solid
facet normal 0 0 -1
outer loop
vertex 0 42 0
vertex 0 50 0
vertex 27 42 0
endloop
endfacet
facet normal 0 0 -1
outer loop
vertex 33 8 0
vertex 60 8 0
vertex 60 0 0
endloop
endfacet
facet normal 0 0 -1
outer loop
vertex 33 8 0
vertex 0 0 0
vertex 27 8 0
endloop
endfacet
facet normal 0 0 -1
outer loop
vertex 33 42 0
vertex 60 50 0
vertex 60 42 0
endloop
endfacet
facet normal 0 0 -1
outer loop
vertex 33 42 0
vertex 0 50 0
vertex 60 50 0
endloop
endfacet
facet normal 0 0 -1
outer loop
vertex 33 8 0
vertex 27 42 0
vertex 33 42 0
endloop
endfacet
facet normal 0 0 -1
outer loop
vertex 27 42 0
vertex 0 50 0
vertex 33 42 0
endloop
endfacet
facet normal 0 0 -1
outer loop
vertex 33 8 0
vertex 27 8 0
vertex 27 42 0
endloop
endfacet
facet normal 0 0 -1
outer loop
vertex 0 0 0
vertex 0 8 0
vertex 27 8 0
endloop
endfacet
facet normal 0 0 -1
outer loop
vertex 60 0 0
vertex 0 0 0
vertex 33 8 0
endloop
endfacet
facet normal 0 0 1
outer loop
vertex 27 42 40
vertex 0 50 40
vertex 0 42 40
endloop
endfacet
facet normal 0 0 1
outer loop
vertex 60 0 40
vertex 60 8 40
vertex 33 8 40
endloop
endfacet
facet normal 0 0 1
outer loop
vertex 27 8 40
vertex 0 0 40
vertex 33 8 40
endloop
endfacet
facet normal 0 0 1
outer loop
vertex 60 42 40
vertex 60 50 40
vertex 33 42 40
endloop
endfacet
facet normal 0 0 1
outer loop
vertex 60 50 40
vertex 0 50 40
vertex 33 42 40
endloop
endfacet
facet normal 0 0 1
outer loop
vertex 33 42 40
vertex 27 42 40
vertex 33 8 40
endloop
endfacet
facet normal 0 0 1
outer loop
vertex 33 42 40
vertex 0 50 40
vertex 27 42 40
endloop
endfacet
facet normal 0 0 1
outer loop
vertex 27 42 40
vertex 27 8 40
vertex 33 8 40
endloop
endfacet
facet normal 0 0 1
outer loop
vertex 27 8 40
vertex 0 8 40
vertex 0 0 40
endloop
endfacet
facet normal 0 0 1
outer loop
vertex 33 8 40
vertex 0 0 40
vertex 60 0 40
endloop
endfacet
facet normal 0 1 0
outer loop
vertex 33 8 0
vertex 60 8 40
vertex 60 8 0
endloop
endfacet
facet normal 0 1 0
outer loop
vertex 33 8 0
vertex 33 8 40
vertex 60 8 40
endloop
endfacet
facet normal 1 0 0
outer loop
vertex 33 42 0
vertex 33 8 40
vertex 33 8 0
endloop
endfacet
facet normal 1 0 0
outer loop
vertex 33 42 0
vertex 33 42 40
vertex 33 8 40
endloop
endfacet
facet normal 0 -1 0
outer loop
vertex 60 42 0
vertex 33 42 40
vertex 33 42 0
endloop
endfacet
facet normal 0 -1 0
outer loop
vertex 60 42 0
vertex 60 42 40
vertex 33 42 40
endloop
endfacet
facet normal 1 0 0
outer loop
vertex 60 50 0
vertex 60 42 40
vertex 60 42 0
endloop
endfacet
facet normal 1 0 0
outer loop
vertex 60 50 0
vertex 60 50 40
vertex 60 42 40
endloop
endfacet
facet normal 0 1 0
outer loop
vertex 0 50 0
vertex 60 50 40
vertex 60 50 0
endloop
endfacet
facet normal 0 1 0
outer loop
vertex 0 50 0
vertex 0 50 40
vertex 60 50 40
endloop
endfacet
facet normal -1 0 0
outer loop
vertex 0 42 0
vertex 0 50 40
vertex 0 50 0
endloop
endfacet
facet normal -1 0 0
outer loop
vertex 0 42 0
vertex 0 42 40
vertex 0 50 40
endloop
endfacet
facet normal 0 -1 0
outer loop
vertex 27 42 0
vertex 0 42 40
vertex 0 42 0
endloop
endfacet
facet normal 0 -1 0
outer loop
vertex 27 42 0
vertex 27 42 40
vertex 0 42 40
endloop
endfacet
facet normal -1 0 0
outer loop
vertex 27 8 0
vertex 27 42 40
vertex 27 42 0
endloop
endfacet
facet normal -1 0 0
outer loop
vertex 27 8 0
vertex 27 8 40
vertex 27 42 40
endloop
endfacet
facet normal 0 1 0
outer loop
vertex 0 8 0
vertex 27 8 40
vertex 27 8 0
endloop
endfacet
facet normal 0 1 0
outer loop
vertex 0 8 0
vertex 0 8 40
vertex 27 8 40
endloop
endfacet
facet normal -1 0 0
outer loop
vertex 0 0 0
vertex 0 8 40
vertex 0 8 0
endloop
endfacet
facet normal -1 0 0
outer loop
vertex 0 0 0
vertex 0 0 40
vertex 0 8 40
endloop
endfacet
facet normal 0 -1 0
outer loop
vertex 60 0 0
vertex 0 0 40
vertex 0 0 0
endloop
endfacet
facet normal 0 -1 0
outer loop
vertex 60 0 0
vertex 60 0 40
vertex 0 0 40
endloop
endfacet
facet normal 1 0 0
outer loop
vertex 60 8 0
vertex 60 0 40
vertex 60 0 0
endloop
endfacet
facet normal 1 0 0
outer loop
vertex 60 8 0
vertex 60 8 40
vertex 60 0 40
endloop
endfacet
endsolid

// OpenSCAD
$fn = 32;

// ----------------------------------------------------------------------
// Structural section: ibeam 60 x 50 mm
// ----------------------------------------------------------------------

// --- parameters (mm) ---
sec_w = 60;               // section width, X
sec_h = 50;               // section height, Y
flange_t = 8;             // flange thickness
web_t = 6;                // web thickness
plate_t = 40;             // cut length, Z (extrusion height)

profile = [[0, 0], [60, 0], [60, 8], [33, 8], [33, 42], [60, 42], [60, 50], [0, 50], [0, 42], [27, 42], [27, 8], [0, 8]];  // primary outline, 12 points, counter clockwise

// --- the one profile operation ---
linear_extrude(height = plate_t) polygon(points = profile);
